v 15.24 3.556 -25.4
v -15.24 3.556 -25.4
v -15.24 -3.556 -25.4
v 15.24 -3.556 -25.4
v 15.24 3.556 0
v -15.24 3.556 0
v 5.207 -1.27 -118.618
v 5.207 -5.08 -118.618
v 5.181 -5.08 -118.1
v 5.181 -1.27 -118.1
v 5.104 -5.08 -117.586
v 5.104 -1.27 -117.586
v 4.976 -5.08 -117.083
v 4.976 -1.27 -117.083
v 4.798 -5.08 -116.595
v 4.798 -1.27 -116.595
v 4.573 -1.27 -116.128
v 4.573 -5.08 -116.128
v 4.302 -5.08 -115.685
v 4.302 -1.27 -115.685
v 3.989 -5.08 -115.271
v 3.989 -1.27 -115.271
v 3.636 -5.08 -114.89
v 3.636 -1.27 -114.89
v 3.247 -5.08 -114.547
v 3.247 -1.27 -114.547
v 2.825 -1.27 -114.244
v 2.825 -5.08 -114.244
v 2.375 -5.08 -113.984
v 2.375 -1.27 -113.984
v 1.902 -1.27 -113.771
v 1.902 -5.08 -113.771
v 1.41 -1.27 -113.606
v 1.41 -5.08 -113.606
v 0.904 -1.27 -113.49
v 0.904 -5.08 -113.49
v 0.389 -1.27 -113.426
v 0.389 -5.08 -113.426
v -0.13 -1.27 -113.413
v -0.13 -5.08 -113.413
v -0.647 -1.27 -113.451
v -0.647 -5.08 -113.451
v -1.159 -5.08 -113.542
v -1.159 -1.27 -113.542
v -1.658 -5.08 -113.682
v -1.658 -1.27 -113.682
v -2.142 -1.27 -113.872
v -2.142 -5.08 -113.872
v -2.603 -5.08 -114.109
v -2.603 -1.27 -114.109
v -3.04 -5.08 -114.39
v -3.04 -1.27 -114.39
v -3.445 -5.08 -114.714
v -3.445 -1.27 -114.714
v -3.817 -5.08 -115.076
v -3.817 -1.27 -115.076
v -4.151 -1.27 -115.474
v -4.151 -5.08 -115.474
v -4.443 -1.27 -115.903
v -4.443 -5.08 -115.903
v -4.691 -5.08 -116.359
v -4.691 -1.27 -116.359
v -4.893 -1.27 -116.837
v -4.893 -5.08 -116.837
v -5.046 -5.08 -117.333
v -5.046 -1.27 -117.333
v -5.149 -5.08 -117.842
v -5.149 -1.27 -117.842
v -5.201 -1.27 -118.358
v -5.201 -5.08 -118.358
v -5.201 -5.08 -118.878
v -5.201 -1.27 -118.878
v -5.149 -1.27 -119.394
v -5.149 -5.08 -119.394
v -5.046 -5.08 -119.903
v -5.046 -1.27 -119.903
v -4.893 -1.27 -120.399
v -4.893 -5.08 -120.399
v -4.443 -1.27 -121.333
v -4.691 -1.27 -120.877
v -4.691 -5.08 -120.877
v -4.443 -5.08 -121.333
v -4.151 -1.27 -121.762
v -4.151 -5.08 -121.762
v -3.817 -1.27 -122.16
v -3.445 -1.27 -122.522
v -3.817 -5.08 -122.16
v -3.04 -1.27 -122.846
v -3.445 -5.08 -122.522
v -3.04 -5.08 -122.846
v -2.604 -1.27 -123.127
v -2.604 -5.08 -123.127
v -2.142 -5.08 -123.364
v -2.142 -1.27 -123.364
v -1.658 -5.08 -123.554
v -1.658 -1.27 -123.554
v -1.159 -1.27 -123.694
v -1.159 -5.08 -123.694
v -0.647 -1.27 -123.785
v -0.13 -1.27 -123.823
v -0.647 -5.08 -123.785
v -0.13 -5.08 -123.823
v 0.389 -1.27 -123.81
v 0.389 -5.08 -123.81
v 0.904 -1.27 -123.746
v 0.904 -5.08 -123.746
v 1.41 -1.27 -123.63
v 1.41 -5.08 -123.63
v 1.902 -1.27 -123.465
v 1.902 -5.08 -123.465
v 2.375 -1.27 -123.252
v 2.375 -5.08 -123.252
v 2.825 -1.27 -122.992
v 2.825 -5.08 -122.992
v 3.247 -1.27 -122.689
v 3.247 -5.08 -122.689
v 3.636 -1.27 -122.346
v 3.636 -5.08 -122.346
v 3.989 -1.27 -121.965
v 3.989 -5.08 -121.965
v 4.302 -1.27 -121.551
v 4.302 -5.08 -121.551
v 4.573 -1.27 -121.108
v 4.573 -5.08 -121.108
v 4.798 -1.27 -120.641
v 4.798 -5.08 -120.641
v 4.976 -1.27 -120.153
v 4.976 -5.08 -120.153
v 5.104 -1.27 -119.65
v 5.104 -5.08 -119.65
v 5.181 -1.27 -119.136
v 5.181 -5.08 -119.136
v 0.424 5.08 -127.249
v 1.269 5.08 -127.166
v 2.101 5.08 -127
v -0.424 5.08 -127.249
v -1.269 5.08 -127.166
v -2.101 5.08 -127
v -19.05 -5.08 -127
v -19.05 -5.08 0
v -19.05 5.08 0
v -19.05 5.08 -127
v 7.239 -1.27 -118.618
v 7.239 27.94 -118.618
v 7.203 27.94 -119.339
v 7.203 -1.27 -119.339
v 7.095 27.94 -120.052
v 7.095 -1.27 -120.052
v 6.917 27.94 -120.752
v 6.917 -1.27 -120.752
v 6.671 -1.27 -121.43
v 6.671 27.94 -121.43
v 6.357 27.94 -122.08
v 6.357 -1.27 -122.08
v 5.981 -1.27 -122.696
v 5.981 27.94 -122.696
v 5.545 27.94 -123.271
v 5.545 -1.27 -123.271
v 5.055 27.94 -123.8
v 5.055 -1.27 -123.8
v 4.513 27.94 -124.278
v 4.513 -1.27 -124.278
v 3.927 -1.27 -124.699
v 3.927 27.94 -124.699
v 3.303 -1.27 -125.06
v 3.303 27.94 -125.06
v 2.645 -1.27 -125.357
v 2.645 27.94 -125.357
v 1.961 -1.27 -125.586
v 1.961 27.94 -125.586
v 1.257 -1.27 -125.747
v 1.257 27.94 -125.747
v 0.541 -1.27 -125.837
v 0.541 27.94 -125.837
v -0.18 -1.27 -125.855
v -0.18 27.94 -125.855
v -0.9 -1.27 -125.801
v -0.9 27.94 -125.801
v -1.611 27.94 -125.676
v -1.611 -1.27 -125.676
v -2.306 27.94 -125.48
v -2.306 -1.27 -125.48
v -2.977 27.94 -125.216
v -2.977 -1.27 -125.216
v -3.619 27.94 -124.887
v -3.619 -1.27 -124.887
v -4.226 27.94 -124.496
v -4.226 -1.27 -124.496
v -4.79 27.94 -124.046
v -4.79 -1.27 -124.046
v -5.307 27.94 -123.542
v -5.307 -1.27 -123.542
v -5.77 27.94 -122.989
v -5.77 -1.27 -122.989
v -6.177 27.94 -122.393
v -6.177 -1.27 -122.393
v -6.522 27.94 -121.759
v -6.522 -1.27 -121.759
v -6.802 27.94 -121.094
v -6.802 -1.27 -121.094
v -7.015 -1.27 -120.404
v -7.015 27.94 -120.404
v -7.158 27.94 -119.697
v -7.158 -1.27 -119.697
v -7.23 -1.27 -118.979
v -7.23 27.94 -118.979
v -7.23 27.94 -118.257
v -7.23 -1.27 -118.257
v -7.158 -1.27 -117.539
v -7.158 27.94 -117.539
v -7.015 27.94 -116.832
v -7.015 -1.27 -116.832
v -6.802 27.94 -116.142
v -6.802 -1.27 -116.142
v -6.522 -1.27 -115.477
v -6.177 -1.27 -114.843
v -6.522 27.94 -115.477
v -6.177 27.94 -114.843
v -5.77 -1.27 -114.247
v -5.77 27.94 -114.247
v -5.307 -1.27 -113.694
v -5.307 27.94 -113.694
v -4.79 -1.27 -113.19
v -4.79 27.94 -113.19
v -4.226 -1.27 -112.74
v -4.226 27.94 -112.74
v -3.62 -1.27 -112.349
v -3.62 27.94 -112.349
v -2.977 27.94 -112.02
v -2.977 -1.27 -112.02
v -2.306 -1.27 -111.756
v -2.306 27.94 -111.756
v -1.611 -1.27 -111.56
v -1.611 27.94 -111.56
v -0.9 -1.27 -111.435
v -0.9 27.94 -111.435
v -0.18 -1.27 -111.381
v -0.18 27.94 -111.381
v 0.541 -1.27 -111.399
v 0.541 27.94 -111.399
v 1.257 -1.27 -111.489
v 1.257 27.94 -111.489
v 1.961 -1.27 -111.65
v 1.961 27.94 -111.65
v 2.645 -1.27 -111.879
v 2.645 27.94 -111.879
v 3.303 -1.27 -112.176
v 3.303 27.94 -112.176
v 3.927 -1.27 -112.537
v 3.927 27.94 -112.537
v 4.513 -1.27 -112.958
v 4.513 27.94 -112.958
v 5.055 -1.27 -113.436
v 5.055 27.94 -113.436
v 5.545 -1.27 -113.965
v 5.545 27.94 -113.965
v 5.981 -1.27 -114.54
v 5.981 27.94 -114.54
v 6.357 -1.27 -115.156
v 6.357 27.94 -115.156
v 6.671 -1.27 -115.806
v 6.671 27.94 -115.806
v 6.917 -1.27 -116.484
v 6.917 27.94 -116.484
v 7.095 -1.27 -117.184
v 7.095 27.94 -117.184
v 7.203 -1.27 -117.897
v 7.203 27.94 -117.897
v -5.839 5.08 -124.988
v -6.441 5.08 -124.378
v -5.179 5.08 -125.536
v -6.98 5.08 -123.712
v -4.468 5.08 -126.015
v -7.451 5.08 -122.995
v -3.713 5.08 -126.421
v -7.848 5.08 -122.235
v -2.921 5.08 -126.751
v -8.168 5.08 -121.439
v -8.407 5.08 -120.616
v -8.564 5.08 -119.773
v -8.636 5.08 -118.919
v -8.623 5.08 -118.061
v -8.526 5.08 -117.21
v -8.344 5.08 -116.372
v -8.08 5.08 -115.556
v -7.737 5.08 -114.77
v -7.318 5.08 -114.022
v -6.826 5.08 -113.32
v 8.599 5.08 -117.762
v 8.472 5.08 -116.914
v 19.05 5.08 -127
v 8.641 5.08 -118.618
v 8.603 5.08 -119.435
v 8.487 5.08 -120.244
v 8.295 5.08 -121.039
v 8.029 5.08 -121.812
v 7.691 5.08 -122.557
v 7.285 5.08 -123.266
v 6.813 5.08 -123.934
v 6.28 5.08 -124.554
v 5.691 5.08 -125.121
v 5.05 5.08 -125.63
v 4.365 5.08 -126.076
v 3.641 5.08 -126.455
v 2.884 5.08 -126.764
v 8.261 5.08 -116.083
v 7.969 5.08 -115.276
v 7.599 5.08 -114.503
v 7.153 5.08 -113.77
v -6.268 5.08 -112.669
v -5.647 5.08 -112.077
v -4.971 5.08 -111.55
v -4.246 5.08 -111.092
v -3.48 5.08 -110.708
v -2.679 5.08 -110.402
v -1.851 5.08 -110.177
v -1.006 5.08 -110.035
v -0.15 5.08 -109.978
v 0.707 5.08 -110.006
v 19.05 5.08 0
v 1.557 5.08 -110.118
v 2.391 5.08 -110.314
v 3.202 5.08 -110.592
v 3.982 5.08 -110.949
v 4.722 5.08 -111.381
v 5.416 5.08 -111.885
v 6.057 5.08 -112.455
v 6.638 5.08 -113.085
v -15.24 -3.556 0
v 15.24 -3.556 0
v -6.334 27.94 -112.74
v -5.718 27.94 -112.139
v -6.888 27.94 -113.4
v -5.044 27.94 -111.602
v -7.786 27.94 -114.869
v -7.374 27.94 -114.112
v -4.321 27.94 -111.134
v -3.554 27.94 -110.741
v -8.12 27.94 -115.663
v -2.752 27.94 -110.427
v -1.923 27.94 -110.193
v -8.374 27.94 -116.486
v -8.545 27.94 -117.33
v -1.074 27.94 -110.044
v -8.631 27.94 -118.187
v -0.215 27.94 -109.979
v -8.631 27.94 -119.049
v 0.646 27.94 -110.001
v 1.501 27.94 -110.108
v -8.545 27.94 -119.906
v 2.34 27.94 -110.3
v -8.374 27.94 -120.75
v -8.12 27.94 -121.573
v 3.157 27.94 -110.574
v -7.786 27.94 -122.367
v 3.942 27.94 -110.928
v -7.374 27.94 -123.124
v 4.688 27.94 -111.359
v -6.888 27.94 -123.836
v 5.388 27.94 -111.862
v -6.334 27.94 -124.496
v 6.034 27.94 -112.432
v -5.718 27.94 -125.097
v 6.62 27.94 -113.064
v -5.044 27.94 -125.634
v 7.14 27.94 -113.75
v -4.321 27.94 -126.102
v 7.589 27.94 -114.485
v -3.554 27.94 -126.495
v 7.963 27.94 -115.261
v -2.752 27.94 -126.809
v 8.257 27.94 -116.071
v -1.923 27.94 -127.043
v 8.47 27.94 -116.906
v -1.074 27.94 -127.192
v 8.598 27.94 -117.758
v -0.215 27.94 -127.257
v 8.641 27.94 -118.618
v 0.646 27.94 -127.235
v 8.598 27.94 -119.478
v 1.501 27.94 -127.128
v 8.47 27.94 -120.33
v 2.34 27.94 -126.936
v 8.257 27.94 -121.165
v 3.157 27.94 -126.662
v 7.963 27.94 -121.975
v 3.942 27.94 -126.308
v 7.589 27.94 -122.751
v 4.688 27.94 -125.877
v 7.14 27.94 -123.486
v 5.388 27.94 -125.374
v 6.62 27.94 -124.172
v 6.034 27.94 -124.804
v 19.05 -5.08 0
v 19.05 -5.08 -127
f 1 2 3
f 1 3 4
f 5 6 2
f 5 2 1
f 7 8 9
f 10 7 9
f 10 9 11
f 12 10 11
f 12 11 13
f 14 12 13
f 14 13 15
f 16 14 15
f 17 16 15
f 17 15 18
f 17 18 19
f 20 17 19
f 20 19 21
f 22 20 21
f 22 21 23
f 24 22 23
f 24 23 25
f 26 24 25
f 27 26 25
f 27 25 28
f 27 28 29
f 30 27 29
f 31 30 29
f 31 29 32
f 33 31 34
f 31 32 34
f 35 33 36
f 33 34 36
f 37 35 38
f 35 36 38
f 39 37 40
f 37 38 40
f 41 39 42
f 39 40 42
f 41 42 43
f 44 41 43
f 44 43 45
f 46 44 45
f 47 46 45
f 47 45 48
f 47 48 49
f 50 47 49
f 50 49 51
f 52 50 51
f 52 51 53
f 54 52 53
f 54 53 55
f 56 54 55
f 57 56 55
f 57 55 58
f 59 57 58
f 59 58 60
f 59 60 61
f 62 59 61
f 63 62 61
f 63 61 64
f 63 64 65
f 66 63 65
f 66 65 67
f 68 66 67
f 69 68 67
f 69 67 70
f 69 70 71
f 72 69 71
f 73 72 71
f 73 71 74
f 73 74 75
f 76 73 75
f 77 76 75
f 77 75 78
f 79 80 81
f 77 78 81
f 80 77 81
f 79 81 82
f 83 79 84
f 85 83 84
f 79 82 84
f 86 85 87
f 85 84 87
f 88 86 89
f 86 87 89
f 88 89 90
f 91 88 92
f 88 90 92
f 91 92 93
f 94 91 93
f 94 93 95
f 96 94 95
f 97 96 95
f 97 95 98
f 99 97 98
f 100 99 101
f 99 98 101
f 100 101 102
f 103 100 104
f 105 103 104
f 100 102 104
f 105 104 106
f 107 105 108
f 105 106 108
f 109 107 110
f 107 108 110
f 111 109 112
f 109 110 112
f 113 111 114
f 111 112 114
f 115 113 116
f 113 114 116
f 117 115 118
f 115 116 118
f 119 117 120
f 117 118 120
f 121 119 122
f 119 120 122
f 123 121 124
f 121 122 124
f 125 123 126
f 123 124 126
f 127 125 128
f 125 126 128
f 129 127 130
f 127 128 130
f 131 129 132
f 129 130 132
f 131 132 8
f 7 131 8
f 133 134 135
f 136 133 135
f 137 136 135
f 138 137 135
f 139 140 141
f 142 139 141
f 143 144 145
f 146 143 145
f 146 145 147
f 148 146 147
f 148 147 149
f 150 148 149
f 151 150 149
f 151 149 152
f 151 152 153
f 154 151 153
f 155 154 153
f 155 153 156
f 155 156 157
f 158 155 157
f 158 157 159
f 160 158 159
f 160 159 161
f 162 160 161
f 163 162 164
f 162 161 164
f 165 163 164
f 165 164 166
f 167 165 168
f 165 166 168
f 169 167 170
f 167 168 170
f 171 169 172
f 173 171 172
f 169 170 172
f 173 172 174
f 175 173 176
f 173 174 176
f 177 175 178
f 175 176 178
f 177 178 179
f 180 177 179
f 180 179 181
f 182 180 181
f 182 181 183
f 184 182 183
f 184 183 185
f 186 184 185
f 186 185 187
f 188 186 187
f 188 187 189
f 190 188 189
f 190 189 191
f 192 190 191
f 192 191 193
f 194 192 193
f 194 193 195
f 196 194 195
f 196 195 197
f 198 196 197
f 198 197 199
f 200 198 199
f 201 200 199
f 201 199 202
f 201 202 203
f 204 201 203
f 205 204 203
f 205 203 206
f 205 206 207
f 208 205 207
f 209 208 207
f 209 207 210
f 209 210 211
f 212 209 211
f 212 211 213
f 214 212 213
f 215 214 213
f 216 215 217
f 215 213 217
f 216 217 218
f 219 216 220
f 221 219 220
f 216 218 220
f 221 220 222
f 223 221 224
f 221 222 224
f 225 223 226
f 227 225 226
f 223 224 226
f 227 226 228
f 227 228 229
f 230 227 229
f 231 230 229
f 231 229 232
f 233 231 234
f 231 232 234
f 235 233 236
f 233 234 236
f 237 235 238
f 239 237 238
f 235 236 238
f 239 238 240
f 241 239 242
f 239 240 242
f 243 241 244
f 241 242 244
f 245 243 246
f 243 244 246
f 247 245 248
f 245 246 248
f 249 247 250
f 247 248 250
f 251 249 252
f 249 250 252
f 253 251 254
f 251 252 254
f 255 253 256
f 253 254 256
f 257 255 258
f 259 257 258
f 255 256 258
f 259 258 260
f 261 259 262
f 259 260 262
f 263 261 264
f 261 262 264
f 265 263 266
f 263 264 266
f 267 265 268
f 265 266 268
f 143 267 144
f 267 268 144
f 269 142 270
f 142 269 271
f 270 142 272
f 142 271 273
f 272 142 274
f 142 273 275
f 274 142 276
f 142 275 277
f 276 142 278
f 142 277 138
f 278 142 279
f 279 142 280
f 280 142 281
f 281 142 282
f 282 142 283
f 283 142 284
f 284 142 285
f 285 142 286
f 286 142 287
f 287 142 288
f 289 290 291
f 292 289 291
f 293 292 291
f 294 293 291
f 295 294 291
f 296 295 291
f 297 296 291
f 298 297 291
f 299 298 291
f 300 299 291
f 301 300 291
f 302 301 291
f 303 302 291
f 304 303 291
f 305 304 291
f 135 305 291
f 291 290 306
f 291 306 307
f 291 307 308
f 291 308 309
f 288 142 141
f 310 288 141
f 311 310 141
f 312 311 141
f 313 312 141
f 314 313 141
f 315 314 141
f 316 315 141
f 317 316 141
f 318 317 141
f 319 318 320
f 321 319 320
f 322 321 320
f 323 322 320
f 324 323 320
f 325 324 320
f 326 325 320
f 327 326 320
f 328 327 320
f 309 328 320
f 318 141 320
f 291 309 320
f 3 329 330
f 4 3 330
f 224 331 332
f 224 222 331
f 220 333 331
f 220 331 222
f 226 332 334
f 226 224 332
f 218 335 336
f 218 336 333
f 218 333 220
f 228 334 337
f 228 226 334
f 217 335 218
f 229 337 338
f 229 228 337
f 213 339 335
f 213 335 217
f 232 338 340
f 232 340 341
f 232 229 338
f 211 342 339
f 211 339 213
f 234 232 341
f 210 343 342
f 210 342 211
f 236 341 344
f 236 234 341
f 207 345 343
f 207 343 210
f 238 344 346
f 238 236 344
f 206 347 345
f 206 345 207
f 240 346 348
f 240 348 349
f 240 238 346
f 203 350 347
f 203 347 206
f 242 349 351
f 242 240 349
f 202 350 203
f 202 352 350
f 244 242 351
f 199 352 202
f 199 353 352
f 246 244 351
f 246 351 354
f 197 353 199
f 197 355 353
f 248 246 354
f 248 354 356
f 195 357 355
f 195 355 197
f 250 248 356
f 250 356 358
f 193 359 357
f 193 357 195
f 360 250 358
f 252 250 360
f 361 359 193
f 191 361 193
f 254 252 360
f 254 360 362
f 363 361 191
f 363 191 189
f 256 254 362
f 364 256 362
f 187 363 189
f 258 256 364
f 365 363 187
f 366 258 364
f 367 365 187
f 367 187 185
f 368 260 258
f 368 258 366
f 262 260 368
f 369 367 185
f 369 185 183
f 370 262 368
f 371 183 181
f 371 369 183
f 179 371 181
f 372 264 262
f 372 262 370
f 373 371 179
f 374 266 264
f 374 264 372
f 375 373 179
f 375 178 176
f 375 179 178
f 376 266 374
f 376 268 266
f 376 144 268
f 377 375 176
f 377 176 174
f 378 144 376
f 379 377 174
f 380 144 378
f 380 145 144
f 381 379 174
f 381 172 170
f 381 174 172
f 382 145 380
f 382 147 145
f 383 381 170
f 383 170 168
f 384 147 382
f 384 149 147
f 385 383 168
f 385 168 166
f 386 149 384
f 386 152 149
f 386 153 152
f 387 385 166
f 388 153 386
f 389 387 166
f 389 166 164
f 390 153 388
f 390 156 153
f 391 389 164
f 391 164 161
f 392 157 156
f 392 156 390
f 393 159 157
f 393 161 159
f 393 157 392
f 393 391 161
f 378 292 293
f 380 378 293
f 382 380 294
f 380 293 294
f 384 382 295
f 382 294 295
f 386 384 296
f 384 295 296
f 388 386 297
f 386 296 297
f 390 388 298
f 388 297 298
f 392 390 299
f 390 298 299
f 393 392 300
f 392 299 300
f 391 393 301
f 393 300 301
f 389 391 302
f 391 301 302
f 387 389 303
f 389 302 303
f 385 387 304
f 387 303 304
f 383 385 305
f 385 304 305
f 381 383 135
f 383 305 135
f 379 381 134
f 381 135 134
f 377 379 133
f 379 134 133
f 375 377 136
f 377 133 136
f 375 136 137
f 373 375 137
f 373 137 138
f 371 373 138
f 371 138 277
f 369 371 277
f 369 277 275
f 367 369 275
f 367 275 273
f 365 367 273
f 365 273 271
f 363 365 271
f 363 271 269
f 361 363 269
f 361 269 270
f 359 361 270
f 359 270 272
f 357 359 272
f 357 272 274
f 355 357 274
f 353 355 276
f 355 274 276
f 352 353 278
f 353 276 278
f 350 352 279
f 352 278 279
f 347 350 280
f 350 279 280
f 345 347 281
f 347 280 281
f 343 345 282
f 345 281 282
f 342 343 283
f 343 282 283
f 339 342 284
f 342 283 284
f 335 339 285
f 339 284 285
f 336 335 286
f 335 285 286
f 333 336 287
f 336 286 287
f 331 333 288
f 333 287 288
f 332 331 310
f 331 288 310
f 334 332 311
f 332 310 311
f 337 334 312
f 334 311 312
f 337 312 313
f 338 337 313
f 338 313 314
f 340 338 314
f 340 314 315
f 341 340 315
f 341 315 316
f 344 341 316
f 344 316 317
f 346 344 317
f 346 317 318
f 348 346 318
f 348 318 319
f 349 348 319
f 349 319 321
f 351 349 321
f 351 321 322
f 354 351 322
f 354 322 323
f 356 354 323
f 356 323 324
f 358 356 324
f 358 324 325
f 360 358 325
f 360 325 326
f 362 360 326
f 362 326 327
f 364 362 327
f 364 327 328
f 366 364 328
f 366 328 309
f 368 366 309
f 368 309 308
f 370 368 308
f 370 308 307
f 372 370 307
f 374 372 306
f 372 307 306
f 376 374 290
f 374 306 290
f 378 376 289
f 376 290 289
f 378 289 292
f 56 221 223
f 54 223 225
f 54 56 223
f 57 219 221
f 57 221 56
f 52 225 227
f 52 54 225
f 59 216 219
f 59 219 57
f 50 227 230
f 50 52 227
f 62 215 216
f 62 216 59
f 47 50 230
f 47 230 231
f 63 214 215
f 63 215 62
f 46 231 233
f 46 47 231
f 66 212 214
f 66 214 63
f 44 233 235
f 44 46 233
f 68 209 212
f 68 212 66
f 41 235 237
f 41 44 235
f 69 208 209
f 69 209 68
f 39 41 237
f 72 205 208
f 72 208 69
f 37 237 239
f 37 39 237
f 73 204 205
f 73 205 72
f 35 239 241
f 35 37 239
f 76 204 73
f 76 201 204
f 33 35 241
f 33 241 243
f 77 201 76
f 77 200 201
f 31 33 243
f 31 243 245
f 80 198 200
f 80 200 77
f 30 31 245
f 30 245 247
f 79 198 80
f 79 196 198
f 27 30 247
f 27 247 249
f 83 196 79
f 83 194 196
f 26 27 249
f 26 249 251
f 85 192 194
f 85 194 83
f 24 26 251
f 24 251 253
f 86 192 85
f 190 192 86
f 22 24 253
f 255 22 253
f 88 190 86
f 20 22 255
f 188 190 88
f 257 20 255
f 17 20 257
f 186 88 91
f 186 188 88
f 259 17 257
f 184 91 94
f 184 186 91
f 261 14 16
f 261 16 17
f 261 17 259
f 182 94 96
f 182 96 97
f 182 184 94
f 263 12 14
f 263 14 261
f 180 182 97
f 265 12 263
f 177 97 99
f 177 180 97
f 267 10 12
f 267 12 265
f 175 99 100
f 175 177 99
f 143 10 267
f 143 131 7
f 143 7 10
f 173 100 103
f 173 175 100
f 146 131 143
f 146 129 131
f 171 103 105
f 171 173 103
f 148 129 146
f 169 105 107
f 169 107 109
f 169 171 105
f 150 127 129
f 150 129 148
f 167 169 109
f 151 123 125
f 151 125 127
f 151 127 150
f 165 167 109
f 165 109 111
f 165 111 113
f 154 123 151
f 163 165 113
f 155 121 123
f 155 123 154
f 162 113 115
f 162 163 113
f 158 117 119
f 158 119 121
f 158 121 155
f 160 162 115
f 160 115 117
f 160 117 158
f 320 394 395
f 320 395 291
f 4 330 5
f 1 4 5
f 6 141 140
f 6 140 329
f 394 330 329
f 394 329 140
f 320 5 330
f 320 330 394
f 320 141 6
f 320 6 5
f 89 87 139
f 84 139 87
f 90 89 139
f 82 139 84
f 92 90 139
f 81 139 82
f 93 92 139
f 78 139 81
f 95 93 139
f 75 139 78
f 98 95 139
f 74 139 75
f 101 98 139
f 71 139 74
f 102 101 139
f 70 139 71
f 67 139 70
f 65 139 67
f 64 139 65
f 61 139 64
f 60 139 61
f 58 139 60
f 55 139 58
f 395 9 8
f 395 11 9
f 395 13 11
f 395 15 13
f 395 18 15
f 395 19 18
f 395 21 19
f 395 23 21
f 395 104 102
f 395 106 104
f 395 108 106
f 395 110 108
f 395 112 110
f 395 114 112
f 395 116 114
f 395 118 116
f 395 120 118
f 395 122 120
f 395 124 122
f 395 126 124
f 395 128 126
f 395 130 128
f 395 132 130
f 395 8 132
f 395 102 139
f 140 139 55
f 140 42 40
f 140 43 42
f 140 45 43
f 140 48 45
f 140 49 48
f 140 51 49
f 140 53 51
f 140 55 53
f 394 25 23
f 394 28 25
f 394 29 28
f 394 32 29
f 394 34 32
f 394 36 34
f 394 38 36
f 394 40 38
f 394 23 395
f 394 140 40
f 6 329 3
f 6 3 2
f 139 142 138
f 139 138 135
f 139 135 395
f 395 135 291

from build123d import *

# Parameters (mm, degrees)
SKETCH1_W           = 38.1
SKETCH1_H           = 10.16
BOSS_EXTRUDE1_DEPTH = 127
SKETCH2_W           = 30.48
SKETCH2_H           = 7.112
CUT_EXTRUDE1_DEPTH  = 25.4
SKETCH3_R           = 7.239
CUT_EXTRUDE2_DEPTH  = 6.35
SKETCH4_R           = 5.207
CUT_EXTRUDE3_DEPTH  = 11.16
SKETCH5_R           = 8.641264269
BOSS_EXTRUDE2_DEPTH = 22.86
SKETCH6_R           = 7.239
CUT_EXTRUDE5_DEPTH  = 22.86


with BuildPart() as part:
    # Sketch1 → Boss-Extrude1 (new body)
    with BuildSketch(Plane.XY):
        Rectangle(SKETCH1_W, SKETCH1_H)
    extrude(amount=-BOSS_EXTRUDE1_DEPTH)

    # Sketch2 → Cut-Extrude1 (cut)
    with BuildSketch(Plane.XY):
        Rectangle(SKETCH2_W, SKETCH2_H)
    extrude(amount=-CUT_EXTRUDE1_DEPTH, mode=Mode.SUBTRACT)

    # Sketch3 → Cut-Extrude2 (cut)
    with BuildSketch(Plane(origin=(0, 5.08, 0), x_dir=(1, 0, 0), z_dir=(0, 1, 0))):
        with Locations((0, 118.618)):
            Circle(SKETCH3_R)
    extrude(amount=-CUT_EXTRUDE2_DEPTH, mode=Mode.SUBTRACT)

    # Sketch4 → Cut-Extrude3 (cut, through all)
    with BuildSketch(Plane.XZ.offset(5.08)):
        with Locations((0, -118.618)):
            Circle(SKETCH4_R)
    extrude(amount=-CUT_EXTRUDE3_DEPTH, mode=Mode.SUBTRACT)

    # Sketch5 → Boss-Extrude2 (add)
    with BuildSketch(Plane(origin=(0, 5.08, 0), x_dir=(1, 0, 0), z_dir=(0, 1, 0))):
        with Locations((0, 118.618)):
            Circle(SKETCH5_R)
    extrude(amount=BOSS_EXTRUDE2_DEPTH)

    # Sketch6 → Cut-Extrude5 (cut)
    with BuildSketch(Plane(origin=(0, 27.94, 0), x_dir=(1, 0, 0), z_dir=(0, 1, 0))):
        with Locations((0, 118.618)):
            Circle(SKETCH6_R)
    extrude(amount=-CUT_EXTRUDE5_DEPTH, mode=Mode.SUBTRACT)


solid = part.part
